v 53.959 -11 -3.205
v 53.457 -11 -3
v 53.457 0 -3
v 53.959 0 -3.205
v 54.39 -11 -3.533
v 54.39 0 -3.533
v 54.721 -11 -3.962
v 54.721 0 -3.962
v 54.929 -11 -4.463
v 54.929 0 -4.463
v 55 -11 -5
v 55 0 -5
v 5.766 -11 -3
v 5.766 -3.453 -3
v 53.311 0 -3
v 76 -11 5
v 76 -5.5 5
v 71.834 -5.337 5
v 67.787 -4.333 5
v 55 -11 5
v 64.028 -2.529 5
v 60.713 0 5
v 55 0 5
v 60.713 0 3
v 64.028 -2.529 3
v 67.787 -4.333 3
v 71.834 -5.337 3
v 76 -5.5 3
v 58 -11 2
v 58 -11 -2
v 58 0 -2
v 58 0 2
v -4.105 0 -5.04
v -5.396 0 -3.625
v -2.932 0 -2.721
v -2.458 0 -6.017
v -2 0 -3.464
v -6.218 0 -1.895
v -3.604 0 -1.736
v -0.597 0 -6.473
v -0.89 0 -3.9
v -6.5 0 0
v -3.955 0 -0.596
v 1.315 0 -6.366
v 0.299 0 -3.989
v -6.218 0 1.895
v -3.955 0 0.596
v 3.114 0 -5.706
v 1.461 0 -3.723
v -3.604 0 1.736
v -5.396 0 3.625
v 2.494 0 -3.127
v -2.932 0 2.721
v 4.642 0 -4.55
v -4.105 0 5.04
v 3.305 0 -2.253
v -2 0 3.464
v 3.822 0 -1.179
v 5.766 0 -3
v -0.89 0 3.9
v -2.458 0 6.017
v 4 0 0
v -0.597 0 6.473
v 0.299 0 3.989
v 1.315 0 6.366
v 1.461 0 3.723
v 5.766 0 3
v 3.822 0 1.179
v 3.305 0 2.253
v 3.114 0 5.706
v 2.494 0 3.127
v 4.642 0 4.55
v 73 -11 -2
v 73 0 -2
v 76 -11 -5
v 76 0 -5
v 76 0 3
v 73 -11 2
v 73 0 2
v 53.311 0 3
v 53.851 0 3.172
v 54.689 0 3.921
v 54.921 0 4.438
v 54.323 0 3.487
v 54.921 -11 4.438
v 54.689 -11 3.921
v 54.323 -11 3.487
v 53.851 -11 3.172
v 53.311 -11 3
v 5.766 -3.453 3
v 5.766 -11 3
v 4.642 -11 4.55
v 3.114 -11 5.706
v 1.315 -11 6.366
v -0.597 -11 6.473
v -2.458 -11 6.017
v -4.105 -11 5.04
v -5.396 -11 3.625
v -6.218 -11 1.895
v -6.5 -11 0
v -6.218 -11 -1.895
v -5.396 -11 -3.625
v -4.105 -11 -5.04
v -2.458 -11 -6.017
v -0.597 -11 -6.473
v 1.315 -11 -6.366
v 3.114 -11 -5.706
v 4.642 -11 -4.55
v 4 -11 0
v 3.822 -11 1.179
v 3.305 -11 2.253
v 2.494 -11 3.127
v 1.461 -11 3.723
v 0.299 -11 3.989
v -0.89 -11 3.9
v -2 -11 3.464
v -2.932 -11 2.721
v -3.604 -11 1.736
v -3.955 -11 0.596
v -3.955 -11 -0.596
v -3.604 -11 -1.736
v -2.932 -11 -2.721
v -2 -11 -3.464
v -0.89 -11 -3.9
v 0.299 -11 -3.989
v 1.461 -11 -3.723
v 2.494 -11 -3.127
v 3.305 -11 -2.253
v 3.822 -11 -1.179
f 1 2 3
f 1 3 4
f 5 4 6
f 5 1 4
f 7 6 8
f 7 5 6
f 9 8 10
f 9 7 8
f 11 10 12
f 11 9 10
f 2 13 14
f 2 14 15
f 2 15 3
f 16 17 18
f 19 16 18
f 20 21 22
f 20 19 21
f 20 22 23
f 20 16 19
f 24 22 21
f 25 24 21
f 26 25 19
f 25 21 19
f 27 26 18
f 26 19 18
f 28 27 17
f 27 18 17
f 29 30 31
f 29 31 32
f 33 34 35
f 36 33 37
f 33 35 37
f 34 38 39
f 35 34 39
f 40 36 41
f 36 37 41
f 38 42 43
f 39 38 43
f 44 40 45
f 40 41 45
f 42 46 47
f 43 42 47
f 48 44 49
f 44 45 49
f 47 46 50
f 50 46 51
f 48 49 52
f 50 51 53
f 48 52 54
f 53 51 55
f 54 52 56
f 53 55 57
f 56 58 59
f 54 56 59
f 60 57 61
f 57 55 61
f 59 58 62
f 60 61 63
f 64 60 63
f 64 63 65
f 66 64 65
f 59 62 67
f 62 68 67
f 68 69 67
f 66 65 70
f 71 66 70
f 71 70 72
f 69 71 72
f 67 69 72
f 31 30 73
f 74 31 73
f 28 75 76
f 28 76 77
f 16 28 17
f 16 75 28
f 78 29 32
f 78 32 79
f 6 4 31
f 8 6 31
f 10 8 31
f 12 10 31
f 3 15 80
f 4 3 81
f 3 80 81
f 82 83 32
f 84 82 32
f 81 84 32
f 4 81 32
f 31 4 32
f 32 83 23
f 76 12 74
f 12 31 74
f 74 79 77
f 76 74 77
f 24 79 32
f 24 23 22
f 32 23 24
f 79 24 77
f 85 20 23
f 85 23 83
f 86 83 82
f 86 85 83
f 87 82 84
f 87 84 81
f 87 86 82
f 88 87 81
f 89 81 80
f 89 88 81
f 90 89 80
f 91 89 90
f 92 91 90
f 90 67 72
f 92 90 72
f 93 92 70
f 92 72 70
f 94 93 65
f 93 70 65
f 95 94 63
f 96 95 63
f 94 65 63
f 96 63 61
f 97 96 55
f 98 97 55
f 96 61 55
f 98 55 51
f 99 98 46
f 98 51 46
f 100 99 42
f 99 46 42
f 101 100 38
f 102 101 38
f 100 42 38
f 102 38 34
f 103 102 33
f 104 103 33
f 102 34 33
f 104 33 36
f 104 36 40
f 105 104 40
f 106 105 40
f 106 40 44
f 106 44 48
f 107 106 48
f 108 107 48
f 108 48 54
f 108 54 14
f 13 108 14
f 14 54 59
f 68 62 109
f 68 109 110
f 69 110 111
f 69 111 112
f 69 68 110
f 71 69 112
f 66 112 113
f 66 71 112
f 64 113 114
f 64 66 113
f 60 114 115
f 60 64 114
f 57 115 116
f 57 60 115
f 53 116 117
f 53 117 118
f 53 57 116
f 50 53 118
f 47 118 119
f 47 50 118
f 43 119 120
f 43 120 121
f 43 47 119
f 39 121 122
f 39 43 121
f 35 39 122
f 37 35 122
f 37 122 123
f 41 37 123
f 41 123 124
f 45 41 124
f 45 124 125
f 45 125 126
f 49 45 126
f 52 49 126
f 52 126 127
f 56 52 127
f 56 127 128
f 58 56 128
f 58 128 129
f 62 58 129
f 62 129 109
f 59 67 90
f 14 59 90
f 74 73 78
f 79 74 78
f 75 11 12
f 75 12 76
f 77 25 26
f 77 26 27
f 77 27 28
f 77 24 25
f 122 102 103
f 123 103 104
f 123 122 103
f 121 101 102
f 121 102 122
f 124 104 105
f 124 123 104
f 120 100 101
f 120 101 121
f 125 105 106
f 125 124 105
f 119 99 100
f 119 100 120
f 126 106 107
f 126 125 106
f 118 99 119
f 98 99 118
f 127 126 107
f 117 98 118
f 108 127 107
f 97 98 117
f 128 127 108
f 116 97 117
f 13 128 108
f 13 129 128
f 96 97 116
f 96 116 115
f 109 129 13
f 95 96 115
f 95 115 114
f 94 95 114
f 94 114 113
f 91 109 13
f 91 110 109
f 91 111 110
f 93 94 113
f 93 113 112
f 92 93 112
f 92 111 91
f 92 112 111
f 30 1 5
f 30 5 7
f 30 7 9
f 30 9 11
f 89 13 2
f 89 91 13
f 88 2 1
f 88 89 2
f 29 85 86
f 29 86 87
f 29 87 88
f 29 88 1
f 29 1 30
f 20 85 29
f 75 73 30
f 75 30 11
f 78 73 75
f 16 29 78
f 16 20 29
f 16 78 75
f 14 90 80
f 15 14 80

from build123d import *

# Parameters (mm, degrees)
F0_R      = 6.5
F0_R_2    = 4
F1_DEPTH  = 15
F3_DEPTH  = 15
F4_W      = 15
F4_H      = 4
F5_DEPTH  = 15
F7_DEPTH  = 15
F8_DEPTH  = 4
F10_DEPTH = 2
F12_DEPTH = 25


with BuildPart() as f1:
    # F0 (on Front) → F1 (new body)
    with BuildSketch(Plane.XZ):
        Circle(F0_R)
        Circle(F0_R_2, mode=Mode.SUBTRACT)
    extrude(amount=F1_DEPTH)

    # F2 (on face) → F3 (join)
    with BuildSketch(Plane.XZ.offset(15)):
        with BuildLine():
            Line((55, 3), (5.7662812973, 3))
            ThreePointArc((5.7662812973, 3), (6.3139064149, 1.5442104078), (6.5, 0))
            ThreePointArc((6.5, 0), (6.3139064149, -1.5442104078), (5.7662812973, -3))
            Line((5.7662812973, -3), (55, -3))
            Line((55, -3), (55, 3))
        make_face()
    extrude(amount=-F3_DEPTH)

    # F4 (on face) → F5 (join)
    with BuildSketch(Plane.XZ.offset(15)):
        Polygon((55, 3), (55, 0), (55, -2), (55, -3), (55, -5), (76, -5), (76, 5), (55, 5), align=None)
        with Locations((65.5, 0)):
            Rectangle(F4_W, F4_H, mode=Mode.SUBTRACT)
    extrude(amount=-F5_DEPTH)

    # F6 (on face) → F7 (join)
    with BuildSketch(Plane.XZ.offset(15)):
        with BuildLine():
            Line((53.3110045666, 3), (52.6317283511, 3))
            ThreePointArc((52.6317283511, 3), (52.9713664589, 2.9713664589), (53.3110045666, 3))
        make_face()
        with BuildLine():
            ThreePointArc((55, 5), (54.5212624717, 3.691116356), (53.3110045666, 3))
            Line((53.3110045666, 3), (55, 3))
            Line((55, 3), (55, 5))
        make_face()
        with BuildLine():
            Line((52.4075180292, -3), (53.4570770231, -3))
            ThreePointArc((53.4570770231, -3), (52.9322975261, -2.9322975261), (52.4075180292, -3))
        make_face()
        with BuildLine():
            ThreePointArc((53.4570770231, -3), (54.569441592, -3.7370064022), (55, -5))
            Line((55, -5), (55, -3))
            Line((55, -3), (53.4570770231, -3))
        make_face()
    extrude(amount=-F7_DEPTH)

    # F8 (cut): a face of the model
    f8_faces = [f1.faces().sort_by_distance(p)[0] for p in [
        (35.8408790092, -15, 0.0001913982),
    ]]
    extrude(f8_faces, amount=-F8_DEPTH, mode=Mode.SUBTRACT)

    # F9 (on face) → F10 (cut)
    with BuildSketch(Plane.XY.offset(5)):
        with BuildLine():
            Line((76, 0), (60.7132725418, 0))
            ThreePointArc((60.7132725418, 0), (67.787035574, -4.3331510207), (76, -5.5))
            Line((76, -5.5), (76, 0))
        make_face()
    extrude(amount=-F10_DEPTH, mode=Mode.SUBTRACT)

    # F11 (on face) → F12 (cut)
    with BuildSketch(Plane.XY.offset(3)):
        Polygon((5.7662812973, 0), (5.7662812973, -3.4528882243), (53.3110045666, 0), align=None)
    extrude(amount=-F12_DEPTH, mode=Mode.SUBTRACT)


solid = f1.part
